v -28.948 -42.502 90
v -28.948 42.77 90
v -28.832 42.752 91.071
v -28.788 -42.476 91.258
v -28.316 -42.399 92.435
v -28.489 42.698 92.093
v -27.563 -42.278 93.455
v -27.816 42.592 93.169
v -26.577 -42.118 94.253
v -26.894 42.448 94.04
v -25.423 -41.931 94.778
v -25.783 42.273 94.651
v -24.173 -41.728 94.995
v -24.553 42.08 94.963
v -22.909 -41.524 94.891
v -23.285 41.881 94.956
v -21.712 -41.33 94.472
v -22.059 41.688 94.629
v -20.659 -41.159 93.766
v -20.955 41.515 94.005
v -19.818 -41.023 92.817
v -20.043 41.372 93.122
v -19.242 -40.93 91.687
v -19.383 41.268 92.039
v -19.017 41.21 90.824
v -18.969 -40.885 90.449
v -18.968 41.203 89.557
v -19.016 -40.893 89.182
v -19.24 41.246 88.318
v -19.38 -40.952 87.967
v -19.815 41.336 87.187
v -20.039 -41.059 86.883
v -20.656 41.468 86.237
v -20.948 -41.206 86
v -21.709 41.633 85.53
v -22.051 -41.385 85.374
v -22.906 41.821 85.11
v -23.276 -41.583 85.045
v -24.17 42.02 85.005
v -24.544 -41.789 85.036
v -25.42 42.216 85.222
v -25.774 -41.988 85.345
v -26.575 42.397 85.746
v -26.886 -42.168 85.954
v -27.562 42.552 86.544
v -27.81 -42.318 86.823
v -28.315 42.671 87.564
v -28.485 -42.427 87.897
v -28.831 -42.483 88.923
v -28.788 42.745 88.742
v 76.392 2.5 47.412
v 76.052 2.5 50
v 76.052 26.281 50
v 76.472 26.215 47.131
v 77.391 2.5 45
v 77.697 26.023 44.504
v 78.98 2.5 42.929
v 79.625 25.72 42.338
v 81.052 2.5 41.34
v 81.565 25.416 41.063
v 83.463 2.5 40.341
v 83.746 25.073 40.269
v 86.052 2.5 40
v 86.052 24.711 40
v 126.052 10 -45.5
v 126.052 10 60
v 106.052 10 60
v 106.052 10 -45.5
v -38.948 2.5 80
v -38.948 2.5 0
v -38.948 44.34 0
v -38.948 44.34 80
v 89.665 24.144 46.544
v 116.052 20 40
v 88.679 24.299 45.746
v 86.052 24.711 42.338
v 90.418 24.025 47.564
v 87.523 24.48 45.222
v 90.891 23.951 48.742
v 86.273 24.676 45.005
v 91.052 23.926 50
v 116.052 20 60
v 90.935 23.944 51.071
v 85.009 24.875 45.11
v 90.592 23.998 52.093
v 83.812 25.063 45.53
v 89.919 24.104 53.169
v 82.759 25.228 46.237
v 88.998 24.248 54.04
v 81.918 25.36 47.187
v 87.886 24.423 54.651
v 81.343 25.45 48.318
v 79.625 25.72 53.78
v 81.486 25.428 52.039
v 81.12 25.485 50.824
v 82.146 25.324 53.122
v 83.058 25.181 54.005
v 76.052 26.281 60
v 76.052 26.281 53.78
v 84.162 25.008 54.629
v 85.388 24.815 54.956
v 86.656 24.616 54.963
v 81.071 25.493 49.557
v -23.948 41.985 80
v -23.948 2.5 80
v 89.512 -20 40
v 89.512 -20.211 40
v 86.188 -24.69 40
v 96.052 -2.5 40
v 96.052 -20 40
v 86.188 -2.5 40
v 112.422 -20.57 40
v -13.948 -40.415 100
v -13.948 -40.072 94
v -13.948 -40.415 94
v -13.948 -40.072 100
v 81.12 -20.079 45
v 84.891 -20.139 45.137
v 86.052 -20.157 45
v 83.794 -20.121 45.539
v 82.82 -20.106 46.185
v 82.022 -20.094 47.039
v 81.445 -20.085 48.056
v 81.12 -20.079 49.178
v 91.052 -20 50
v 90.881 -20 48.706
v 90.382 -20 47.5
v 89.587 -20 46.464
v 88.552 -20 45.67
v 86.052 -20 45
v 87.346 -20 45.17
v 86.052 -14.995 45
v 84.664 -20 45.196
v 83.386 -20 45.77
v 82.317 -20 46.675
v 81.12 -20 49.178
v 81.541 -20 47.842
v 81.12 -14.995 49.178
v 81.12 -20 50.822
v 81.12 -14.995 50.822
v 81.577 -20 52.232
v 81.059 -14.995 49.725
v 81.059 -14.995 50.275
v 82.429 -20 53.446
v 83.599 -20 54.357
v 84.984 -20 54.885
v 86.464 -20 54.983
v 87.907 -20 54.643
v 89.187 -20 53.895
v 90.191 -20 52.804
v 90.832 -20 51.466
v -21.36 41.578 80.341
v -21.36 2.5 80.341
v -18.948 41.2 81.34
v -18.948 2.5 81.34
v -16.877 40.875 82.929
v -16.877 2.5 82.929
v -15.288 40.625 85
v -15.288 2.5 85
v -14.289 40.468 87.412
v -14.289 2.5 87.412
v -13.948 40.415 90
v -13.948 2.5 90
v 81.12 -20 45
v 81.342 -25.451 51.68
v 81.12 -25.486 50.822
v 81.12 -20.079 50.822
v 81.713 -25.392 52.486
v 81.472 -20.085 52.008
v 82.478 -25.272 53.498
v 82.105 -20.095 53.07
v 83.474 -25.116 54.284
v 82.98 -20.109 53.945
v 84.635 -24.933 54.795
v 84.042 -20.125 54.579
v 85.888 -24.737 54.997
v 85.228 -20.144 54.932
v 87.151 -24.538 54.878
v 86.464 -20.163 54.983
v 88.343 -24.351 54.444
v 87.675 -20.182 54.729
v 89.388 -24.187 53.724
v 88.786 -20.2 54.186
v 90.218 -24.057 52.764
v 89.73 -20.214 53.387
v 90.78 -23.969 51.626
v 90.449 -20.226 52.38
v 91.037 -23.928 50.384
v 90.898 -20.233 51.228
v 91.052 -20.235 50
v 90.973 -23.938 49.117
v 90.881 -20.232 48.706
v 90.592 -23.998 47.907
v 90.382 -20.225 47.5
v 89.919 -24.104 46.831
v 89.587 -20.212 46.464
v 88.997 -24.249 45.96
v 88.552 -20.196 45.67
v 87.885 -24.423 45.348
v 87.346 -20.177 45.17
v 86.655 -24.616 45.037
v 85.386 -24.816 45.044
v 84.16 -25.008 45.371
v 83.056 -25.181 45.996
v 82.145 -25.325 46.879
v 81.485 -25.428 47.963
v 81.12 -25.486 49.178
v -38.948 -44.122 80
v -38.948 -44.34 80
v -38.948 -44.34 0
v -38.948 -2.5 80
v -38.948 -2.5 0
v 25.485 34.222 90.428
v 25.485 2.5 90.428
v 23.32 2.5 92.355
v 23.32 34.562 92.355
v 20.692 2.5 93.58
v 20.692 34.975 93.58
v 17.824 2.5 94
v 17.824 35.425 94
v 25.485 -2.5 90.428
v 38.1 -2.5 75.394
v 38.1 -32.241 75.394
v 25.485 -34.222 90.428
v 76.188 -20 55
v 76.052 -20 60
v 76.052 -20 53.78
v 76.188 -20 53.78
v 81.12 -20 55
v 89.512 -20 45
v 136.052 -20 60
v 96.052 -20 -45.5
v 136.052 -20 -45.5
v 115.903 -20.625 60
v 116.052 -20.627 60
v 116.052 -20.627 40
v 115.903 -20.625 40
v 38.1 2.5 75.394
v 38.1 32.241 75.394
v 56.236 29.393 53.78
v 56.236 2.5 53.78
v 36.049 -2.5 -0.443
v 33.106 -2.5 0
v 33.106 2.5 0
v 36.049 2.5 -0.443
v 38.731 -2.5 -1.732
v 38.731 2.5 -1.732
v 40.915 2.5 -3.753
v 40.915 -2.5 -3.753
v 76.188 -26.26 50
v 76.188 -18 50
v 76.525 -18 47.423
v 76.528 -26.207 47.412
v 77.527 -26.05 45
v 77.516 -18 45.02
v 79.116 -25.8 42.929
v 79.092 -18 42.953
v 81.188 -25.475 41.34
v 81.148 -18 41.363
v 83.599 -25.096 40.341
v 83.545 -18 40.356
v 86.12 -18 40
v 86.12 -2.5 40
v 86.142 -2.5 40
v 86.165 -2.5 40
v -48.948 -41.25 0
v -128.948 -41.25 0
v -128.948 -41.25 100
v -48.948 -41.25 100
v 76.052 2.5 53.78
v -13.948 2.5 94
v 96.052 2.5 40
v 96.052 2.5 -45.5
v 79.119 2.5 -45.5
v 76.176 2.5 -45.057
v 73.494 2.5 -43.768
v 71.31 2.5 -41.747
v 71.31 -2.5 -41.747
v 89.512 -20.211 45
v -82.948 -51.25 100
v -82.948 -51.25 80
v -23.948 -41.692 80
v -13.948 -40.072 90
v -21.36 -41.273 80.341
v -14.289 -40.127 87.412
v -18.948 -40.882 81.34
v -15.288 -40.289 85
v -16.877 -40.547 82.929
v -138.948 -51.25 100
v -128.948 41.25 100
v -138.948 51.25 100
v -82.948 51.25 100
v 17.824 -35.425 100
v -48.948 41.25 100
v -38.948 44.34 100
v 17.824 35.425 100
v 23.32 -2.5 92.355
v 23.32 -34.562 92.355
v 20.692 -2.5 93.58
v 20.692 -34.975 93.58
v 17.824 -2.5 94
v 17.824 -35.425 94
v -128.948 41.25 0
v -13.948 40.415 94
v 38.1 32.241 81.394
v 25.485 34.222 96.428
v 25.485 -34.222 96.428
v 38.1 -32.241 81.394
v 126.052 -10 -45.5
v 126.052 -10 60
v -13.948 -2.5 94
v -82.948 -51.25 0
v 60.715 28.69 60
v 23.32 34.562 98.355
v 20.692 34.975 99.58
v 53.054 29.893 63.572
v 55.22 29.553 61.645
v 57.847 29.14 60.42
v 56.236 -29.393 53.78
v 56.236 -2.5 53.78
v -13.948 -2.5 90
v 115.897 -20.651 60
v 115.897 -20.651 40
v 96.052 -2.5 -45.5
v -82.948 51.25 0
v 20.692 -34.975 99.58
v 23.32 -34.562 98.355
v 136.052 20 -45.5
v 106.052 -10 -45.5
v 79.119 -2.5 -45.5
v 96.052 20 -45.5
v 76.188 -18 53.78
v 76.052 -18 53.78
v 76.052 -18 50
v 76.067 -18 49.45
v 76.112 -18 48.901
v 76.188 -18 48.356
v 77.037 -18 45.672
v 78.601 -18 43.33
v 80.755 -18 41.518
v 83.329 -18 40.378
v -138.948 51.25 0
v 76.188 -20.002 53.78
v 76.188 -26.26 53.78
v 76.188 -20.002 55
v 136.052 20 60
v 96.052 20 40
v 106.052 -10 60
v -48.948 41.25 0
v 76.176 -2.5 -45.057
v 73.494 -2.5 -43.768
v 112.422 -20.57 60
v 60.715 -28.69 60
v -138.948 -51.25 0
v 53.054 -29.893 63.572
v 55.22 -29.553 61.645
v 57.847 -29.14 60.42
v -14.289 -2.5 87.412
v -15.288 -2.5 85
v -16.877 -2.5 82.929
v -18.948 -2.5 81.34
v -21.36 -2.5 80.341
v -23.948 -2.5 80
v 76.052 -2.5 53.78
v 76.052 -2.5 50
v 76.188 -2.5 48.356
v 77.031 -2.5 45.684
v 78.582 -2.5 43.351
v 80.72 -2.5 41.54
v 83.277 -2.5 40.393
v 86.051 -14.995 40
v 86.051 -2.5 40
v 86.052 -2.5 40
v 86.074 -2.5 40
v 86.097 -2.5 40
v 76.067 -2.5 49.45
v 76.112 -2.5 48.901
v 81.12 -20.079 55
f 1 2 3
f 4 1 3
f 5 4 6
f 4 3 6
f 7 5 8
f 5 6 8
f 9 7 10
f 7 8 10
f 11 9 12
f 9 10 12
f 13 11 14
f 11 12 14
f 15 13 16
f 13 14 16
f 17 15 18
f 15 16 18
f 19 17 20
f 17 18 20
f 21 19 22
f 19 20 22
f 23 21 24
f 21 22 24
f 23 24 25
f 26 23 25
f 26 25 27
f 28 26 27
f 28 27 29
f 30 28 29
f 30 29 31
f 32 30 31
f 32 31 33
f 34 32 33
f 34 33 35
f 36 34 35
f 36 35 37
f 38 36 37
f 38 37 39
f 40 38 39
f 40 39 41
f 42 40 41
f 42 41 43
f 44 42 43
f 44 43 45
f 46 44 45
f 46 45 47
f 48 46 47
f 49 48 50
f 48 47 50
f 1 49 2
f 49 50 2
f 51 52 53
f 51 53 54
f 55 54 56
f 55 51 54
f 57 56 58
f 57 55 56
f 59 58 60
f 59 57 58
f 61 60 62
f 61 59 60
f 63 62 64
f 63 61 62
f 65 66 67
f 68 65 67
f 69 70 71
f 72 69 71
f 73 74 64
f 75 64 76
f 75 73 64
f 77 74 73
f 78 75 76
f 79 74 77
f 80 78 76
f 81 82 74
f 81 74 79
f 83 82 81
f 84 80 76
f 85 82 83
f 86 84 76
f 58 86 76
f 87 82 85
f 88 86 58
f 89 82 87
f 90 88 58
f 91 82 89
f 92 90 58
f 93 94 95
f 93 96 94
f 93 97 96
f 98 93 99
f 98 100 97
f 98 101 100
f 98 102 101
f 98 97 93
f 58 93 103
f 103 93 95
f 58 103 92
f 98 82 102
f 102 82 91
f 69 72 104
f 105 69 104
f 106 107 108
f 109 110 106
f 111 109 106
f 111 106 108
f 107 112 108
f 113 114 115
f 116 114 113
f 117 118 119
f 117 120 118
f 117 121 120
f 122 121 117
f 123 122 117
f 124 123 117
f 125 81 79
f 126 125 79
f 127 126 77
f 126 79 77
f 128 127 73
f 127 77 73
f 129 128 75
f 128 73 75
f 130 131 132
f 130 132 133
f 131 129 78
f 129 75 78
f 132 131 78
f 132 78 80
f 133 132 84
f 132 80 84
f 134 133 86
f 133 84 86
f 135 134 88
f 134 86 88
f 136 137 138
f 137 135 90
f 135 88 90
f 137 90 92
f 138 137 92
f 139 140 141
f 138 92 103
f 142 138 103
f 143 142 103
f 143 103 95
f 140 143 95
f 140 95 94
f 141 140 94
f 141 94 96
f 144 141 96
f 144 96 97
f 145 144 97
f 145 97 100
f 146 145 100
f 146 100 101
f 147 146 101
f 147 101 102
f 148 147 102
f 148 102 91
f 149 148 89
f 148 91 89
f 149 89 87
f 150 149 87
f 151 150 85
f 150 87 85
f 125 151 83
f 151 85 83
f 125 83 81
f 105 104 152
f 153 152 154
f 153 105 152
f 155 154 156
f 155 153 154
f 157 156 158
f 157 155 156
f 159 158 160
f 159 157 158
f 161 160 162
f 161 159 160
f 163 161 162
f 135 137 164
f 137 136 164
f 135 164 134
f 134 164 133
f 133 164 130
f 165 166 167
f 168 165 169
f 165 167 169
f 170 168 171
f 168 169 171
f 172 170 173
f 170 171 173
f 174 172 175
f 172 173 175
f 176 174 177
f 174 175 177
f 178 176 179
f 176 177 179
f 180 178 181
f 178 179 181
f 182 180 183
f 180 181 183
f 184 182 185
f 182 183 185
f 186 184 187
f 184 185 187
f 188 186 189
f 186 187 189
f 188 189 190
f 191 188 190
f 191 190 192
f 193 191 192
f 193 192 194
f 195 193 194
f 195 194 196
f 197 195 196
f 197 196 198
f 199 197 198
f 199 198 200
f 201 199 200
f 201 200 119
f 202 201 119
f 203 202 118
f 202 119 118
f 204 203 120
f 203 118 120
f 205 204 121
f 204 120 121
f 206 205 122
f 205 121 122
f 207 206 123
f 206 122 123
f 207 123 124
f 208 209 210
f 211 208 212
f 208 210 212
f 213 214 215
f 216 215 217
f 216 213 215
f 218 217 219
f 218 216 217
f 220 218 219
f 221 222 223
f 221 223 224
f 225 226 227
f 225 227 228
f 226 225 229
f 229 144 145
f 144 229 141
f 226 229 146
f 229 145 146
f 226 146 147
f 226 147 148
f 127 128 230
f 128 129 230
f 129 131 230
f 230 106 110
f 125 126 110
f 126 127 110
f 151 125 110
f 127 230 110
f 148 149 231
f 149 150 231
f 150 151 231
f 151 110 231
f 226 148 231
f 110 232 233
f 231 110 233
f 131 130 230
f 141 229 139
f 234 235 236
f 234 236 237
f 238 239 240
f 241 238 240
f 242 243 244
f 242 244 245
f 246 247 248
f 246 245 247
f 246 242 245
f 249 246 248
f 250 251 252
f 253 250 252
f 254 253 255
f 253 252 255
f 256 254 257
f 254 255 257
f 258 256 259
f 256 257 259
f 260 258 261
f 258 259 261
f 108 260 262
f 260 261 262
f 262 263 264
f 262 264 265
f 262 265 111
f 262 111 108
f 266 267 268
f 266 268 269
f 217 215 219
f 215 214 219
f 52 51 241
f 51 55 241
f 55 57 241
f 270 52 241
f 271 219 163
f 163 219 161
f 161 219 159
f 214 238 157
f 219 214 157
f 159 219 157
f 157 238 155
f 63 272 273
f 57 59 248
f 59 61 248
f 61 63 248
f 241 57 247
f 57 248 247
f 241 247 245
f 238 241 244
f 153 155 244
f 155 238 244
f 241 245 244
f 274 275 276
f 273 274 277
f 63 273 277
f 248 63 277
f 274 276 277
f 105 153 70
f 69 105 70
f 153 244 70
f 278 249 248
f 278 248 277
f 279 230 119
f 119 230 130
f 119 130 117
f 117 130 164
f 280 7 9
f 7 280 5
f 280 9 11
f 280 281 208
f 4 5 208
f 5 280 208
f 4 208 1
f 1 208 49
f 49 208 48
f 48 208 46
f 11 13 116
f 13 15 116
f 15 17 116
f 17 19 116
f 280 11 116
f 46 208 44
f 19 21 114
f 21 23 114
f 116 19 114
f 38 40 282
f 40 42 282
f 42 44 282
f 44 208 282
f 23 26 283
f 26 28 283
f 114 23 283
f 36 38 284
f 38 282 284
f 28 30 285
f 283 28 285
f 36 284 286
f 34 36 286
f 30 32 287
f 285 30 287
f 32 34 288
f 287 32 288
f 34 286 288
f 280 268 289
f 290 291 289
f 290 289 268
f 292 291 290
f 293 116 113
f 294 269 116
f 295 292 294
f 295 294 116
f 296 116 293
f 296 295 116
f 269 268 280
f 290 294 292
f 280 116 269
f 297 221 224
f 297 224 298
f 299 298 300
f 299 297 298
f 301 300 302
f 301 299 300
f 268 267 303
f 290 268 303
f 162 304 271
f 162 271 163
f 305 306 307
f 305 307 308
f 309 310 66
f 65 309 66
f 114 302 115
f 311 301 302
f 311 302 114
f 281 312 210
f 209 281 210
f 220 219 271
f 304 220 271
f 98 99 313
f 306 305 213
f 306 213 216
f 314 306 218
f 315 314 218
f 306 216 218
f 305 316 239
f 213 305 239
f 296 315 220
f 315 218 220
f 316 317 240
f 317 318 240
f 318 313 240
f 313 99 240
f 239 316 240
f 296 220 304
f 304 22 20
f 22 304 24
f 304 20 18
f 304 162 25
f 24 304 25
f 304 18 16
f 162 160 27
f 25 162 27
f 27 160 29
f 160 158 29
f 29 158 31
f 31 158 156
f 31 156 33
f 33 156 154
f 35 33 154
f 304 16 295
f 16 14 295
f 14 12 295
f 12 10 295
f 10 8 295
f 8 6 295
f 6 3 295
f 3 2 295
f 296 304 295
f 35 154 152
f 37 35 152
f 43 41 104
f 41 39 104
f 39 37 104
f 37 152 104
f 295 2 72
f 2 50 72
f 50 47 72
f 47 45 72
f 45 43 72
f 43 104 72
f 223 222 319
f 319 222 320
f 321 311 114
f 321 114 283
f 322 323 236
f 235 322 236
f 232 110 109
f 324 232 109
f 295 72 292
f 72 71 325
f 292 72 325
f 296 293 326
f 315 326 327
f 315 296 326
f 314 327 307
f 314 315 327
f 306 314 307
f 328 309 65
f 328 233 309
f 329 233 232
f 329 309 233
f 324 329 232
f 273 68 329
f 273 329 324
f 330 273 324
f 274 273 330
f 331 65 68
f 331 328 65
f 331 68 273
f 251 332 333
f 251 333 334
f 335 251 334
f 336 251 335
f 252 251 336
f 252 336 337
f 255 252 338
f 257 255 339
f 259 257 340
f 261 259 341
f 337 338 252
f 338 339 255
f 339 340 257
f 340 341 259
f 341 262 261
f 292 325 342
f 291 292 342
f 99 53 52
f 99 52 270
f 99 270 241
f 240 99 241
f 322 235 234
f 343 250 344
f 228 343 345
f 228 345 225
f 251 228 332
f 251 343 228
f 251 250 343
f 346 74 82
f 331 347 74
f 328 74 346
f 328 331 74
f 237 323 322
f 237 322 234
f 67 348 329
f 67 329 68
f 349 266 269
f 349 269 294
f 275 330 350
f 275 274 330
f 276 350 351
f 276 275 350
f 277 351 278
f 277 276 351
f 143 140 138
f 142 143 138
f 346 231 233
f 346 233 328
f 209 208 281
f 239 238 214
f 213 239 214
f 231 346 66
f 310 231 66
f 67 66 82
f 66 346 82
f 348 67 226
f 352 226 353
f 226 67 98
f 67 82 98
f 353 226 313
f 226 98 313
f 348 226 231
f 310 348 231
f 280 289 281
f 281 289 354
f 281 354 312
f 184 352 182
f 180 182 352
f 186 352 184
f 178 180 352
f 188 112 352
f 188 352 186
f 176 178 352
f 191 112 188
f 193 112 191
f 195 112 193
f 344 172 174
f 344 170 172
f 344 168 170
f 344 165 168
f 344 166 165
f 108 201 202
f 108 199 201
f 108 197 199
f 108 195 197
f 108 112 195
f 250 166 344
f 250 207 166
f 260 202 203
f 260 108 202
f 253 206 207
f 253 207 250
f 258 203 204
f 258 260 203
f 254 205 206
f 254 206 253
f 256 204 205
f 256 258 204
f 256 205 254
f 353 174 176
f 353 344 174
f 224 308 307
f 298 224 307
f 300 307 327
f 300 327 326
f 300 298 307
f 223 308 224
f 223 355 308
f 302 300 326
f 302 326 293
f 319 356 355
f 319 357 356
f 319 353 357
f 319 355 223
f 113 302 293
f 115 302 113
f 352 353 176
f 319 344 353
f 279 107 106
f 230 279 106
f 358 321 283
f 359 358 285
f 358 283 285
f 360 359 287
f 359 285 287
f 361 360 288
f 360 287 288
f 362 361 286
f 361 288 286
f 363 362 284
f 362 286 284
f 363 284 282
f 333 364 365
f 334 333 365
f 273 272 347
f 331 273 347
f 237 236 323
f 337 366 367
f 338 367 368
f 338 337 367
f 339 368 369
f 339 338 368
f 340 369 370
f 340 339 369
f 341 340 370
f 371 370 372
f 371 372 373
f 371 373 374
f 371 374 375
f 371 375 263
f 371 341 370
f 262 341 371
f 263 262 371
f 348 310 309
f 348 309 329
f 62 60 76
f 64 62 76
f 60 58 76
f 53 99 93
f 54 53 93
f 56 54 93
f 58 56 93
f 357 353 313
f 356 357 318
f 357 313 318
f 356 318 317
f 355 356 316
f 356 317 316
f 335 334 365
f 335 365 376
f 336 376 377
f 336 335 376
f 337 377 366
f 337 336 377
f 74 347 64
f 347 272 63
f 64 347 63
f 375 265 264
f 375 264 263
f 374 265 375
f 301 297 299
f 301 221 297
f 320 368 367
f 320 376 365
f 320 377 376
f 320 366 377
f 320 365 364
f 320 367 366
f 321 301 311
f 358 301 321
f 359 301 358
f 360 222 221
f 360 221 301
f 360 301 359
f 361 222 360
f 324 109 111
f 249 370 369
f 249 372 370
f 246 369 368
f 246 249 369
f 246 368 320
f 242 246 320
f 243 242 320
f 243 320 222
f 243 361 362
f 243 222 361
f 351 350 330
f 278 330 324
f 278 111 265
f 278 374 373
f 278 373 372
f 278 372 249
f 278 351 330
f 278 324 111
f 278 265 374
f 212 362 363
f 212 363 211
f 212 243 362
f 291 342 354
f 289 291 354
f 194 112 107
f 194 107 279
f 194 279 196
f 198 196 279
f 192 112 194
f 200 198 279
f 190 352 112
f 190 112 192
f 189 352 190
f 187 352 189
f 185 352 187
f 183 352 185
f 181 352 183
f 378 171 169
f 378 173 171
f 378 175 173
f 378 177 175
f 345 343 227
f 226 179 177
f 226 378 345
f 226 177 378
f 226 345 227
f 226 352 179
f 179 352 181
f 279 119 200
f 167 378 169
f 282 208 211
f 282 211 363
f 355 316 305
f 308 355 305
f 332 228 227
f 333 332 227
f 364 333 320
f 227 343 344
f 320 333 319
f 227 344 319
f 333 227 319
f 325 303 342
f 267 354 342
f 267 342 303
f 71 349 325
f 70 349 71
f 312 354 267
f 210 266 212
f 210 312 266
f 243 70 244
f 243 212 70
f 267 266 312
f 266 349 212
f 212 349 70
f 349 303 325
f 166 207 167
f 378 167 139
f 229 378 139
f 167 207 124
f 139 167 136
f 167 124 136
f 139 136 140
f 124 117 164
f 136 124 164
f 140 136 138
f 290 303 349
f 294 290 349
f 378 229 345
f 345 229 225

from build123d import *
from build123d.topology import SkipClean

# Parameters (mm, degrees)
ESQUISSE1_W                   = 80
ESQUISSE1_H                   = 82.5
BOSS_EXTRU_3_DEPTH            = 100
ESQUISSE2_W                   = 25
ESQUISSE2_H                   = 20
BOSS_EXTRU_4_DEPTH            = 102.5
ENL_V_MAT_EXTRU_1_DEPTH       = 169.324814886
ESQUISSE5_W                   = 25
ESQUISSE5_H                   = 5
BOSS_EXTRU_6_DEPTH            = 80
ESQUISSE6_R                   = 5
ENL_V_MAT_EXTRU_2_DEPTH       = 200.531778938
CONG_1_R                      = 10
BOSS_EXTRU_7_DEPTH            = 132
BOSS_EXTRU_7_DEPTH_BACK       = 156
ESQUISSE7_W                   = 40
ESQUISSE7_H                   = 40
ESQUISSE7_W_2                 = 20
ESQUISSE7_H_2                 = 20
ESQUISSE8_W                   = 56.966100386
ESQUISSE8_H                   = 72.151969112
ESQUISSE8_H_2                 = 40
ENL_V_MAT_EXTRU_3_DEPTH       = 233.699228203
ESQUISSE9_W                   = 40
ESQUISSE9_H                   = 86.5
ENL_V_MAT_EXTRU_4_DEPTH       = 205.46819632
ESQUISSE10_W                  = 20
ESQUISSE10_H                  = 20
BOSS_EXTRU_9_DEPTH            = 40
BOSS_EXTRU_10_REACH           = 209.614
ESQUISSE11_W                  = 20
ESQUISSE11_H                  = 5
BOSS_EXTRU_11_DEPTH           = 20
ESQUISSE14_R                  = 5
ENL_V_MAT_EXTRU_5_DEPTH       = 200.531778938
CONG_2_R                      = 10
CONG_3_R                      = 10
BOSS_EXTRU_30_DEPTH           = 102.5
ESQUISSE27_W                  = 37.951925993
ESQUISSE27_H                  = 112.382443636
BOSS_EXTRU_49_DEPTH           = 60
ENL_V_MAT_EXTRU_8_DEPTH       = 205.784019015
ESQUISSE29_W                  = 18.162926374
ESQUISSE29_H                  = 48.488335355
ENL_V_MAT_EXTRU_9_DEPTH       = 205.784019015
ENL_V_MAT_EXTRU_15_DEPTH      = 188.114342077
ENL_V_MAT_EXTRU_15_DEPTH_BACK = 104
ENL_V_MAT_EXTRU_25_DEPTH      = 202.764949791
ENL_V_MAT_EXTRU_33_DEPTH      = 157
ENL_V_MAT_EXTRU_34_DEPTH      = 157
BOSS_EXTRU_60_REACH           = 180.699
ESQUISSE48_W                  = 90
ESQUISSE48_H                  = 5
ESQUISSE49_W                  = 4.284374684
ESQUISSE49_H                  = 33.615862906
BOSS_EXTRU_61_DEPTH           = 5
BOSS_EXTRU_63_DEPTH           = 44
BOSS_EXTRU_63_DEPTH_BACK      = 17.5
ENL_V_MAT_EXTRU_35_DEPTH      = 212.123022919
CONG_5_START                  = 2.5
CONG_5_DEPTH                  = 48.75
BOSS_EXTRU_70_DEPTH           = 15.5
CONG_6_R                      = 10
ESQUISSE70_W                  = 13.324534179
ESQUISSE70_H                  = 11.766054646
BOSS_EXTRU_72_DEPTH           = 5
ESQUISSE71_W                  = 4.931981982
ESQUISSE71_H                  = 11.766054646
BOSS_EXTRU_73_DEPTH           = 15
CONG_7_R                      = 10
ENL_V_MAT_EXTRU_36_DEPTH      = 208.613808082
BOSS_EXTRU_74_REACH           = 209.614
ESQUISSE75_W                  = 50.566617397
ESQUISSE75_H                  = 5
ENL_V_MAT_EXTRU_37_DEPTH      = 180.431723244
ENL_V_MAT_EXTRU_37_DEPTH_BACK = 60
CONG_8_R                      = 10


with BuildPart() as part:
    # Esquisse1 → Boss.-Extru.3 (new body)
    with BuildSketch(Plane.XY):
        Polygon((-138.948482562, -51.25), (-82.948482562, -51.25), (-38.948482562, -44.340452261), (-38.948482562, 44.340452261), (-82.948482562, 51.25), (-138.948482562, 51.25), align=None)
        with Locations((-88.948482562, 0)):
            Rectangle(ESQUISSE1_W, ESQUISSE1_H, mode=Mode.SUBTRACT)
    extrude(amount=BOSS_EXTRU_3_DEPTH)

    # Esquisse2 → Boss.-Extru.4 (add, through all)
    with BuildSketch(Plane(origin=(0, 51.25, 0), x_dir=(1, 0, 0), z_dir=(0, 1, 0))):
        with Locations((-26.448482562, -90)):
            Rectangle(ESQUISSE2_W, ESQUISSE2_H)
    extrude(amount=-BOSS_EXTRU_4_DEPTH)

    # Esquisse4 → Enlèv. mat.-Extru.1 (cut, through all)
    with BuildSketch(Plane(origin=(0, 0, 80), x_dir=(-1, 0, 0), z_dir=(0, 0, -1))):
        Polygon((82.948482562, 51.25), (7.101445633, 39.733012599), (13.461078658, 66.038767386), (82.948482562, 62.280802417), align=None)
        Polygon((82.948482562, -51.25), (-9.375785388, -36.29350948), (26.758493166, -73.584084948), align=None)
    extrude(amount=-ENL_V_MAT_EXTRU_1_DEPTH, mode=Mode.SUBTRACT)

    # Esquisse5 → Boss.-Extru.6 (add)
    with BuildSketch(Plane(origin=(0, 0, 80), x_dir=(-1, 0, 0), z_dir=(0, 0, -1))):
        with Locations((26.448482562, 0)):
            Rectangle(ESQUISSE5_W, ESQUISSE5_H)
    extrude(amount=BOSS_EXTRU_6_DEPTH)

    # Esquisse6 → Enlèv. mat.-Extru.2 (cut, through all)
    with BuildSketch(Plane(origin=(0, 51.25, 0), x_dir=(1, 0, 0), z_dir=(0, 1, 0))):
        with Locations(Location((-23.948482562, -90, 0), (0, 0, 180))):
            Circle(ESQUISSE6_R)
    extrude(amount=-ENL_V_MAT_EXTRU_2_DEPTH, mode=Mode.SUBTRACT)

    # Congé1
    cong_1_edges = [part.edges().sort_by_distance(p)[0] for p in [
        (-13.948482562, -21.286015279, 80),
        (-13.948482562, 21.636350193, 80),
    ]]
    fillet(cong_1_edges, radius=CONG_1_R)

    # Esquisse21 → Boss.-Extru.30 (add, through all)
    with BuildSketch(Plane(origin=(0, 51.25, 0), x_dir=(1, 0, 0), z_dir=(0, 1, 0))):
        with BuildLine():
            Line((40.768208739, -72.213938048), (25.484900041, -90.427876097))
            ThreePointArc((25.484900041, -90.427876097), (22.050638227, -93.06307787), (17.824455609, -94))
            Line((17.824455609, -94), (13.584684534, -94))
            Line((13.584684534, -94), (-13.948482562, -94))
            Line((-13.948482562, -94), (-13.948482562, -97))
            Line((-13.948482562, -97), (-13.948482562, -100))
            Line((-13.948482562, -100), (17.824455609, -100))
            ThreePointArc((17.824455609, -100), (22.050638227, -99.06307787), (25.484900041, -96.427876097))
            Line((25.484900041, -96.427876097), (43.69734513, -74.723129231))
            Line((43.69734513, -74.723129231), (40.768208739, -72.213938048))
        make_face()
    extrude(amount=-BOSS_EXTRU_30_DEPTH)



with BuildPart() as body_2:
    # Esquisse7 → Boss.-Extru.7 (new, two sides: drawn at the far end of the back side and taken through both)
    with BuildSketch(Plane(origin=(0, 0, 0), x_dir=(-1, 0, 0), z_dir=(0, 0, -1)).offset(-BOSS_EXTRU_7_DEPTH_BACK)):
        with Locations((-116.051517438, 0)):
            Rectangle(ESQUISSE7_W, ESQUISSE7_H)
        with Locations((-116.051517438, 0)):
            Rectangle(ESQUISSE7_W_2, ESQUISSE7_H_2, mode=Mode.SUBTRACT)
    extrude(amount=BOSS_EXTRU_7_DEPTH + BOSS_EXTRU_7_DEPTH_BACK)

    # Esquisse8 → Enlèv. mat.-Extru.3 (cut, through all)
    with BuildSketch(Plane(origin=(0, 51.25, 0), x_dir=(1, 0, 0), z_dir=(0, 1, 0))):
        with Locations((124.534567631, -136.075984556)):
            Rectangle(ESQUISSE8_W, ESQUISSE8_H)
        with Locations((124.534567631, -80)):
            Rectangle(ESQUISSE8_W, ESQUISSE8_H_2)
    extrude(amount=-ENL_V_MAT_EXTRU_3_DEPTH, mode=Mode.SUBTRACT)

    # Esquisse9 → Enlèv. mat.-Extru.4 (cut, through all)
    with BuildSketch(Plane(origin=(0, 20, 0), x_dir=(1, 0, 0), z_dir=(0, 1, 0))):
        with Locations((116.051517438, 88.75)):
            Rectangle(ESQUISSE9_W, ESQUISSE9_H)
    extrude(amount=-ENL_V_MAT_EXTRU_4_DEPTH, mode=Mode.SUBTRACT)

    # Esquisse10 → Boss.-Extru.9 (add)
    with BuildSketch(Plane(origin=(0, 20, 0), x_dir=(1, 0, 0), z_dir=(0, 1, 0))):
        with Locations((86.051517438, -50)):
            Rectangle(ESQUISSE10_W, ESQUISSE10_H)
    extrude(amount=-BOSS_EXTRU_9_DEPTH)

    # Esquisse11 → Boss.-Extru.10 (add, up to next)
    with BuildSketch(Plane(origin=(0, 0, -45.5), x_dir=(-1, 0, 0), z_dir=(0, 0, -1)), mode=Mode.PRIVATE) as boss_extru_10_sk1:
        with Locations((-86.051517438, 0)):
            Rectangle(ESQUISSE11_W, ESQUISSE11_H)
    boss_extru_10_tool1 = extrude(boss_extru_10_sk1.sketch, amount=-BOSS_EXTRU_10_REACH, mode=Mode.PRIVATE) - body_2.part
    add(boss_extru_10_tool1.solids().sort_by_distance((86.051517, 0, -45.5))[0])

    # Esquisse13 → Boss.-Extru.11 (add)
    with BuildSketch(Plane.XY.offset(60)):
        Polygon((116.051517438, 20), (76.051517438, 26.281407035), (76.051517438, 20), align=None)
        Polygon((116.051517438, -20.626903689), (76.051517438, -20), (75.510830831, -26.86550344), align=None)
    extrude(amount=-BOSS_EXTRU_11_DEPTH)


with BuildPart() as boss_extru_11_piece_1:
    # of the separate pieces the step leaves, piece 1, a body of its own (boss_extru_11_pieces)
    add(body_2.part.solids().sort_by_distance((136.051517438, -20, 60))[0])


with BuildPart() as boss_extru_11_piece_2:
    # of the separate pieces the step leaves, piece 2, a body of its own (boss_extru_11_pieces)
    add(body_2.part.solids().sort_by_distance((116.051517438, -20.626903689, 60))[0])


with BuildPart() as enl_v_mat_extru_5_tool:
    # Esquisse14 → Enlèv. mat.-Extru.5 (new, through all)
    with BuildSketch(Plane(origin=(0, 51.25, 0), x_dir=(1, 0, 0), z_dir=(0, 1, 0))):
        with Locations((86.051517438, -50)):
            Circle(ESQUISSE14_R)
    extrude(amount=-ENL_V_MAT_EXTRU_5_DEPTH)


with BuildPart() as boss_extru_11_piece_1_1:
    add(boss_extru_11_piece_1.part)

    # Enlèv. mat.-Extru.5: cut by enl_v_mat_extru_5_tool
    add(enl_v_mat_extru_5_tool.part, mode=Mode.SUBTRACT)

    # Congé2
    cong_2_edges = [boss_extru_11_piece_1_1.edges().sort_by_distance(p)[0] for p in [
        (76.051517438, -11.25, 40),
        (76.051517438, 14.390703518, 40),
    ]]
    fillet(cong_2_edges, radius=CONG_2_R)


with BuildPart() as boss_extru_11_piece_2_1:
    add(boss_extru_11_piece_2.part)

    # Enlèv. mat.-Extru.5: cut by enl_v_mat_extru_5_tool
    add(enl_v_mat_extru_5_tool.part, mode=Mode.SUBTRACT)

    # Congé3
    cong_3_edges = [boss_extru_11_piece_2_1.edges().sort_by_distance(p)[0] for p in [
        (75.781174135, -23.43275172, 40),
    ]]
    fillet(cong_3_edges, radius=CONG_3_R)


with BuildPart() as part_1:
    add(part.part)

    add(boss_extru_11_piece_1_1.part)  # Boss.-Extru.49 merges Boss.-Extru.11 piece 1

    add(boss_extru_11_piece_2_1.part)  # Boss.-Extru.49 merges Boss.-Extru.11 piece 2
    # Esquisse27 → Boss.-Extru.49 (add, through all)
    with BuildSketch(Plane(origin=(0, 0, 40), x_dir=(-1, 0, 0), z_dir=(0, 0, -1))):
        with Locations((-57.075554442, -0.659134567)):
            Rectangle(ESQUISSE27_W, ESQUISSE27_H)
    extrude(amount=-BOSS_EXTRU_49_DEPTH)

    # Esquisse28 → Enlèv. mat.-Extru.8 (cut, through all)
    with BuildSketch(Plane(origin=(0, 55.532087251, 0), x_dir=(1, 0, 0), z_dir=(0, 1, 0))):
        with BuildLine():
            ThreePointArc((60.71459402, -60), (56.488411402, -60.93692213), (53.054149588, -63.572123903))
            Line((53.054149588, -63.572123903), (38.099591445, -81.394272297))
            Line((38.099591445, -81.394272297), (38.099591445, -100))
            Line((38.099591445, -100), (76.006099273, -100))
            Line((76.006099273, -100), (76.051517438, -60))
            Line((76.051517438, -60), (60.71459402, -60))
        make_face()
    extrude(amount=-ENL_V_MAT_EXTRU_8_DEPTH, mode=Mode.SUBTRACT)


with BuildPart() as enl_v_mat_extru_8_piece_1:
    # of the separate pieces the step leaves, piece 1, a body of its own (enl_v_mat_extru_8_pieces)
    add(part_1.part.solids().sort_by_distance((86.070114786, -20.157017391, 40))[0])

    # Esquisse33 → Enlèv. mat.-Extru.15 (cut, two sides: drawn at the far end of the back side and taken through both)
    with BuildSketch(Plane.XZ.offset(20).offset(-ENL_V_MAT_EXTRU_15_DEPTH_BACK)):
        Polygon((27.047173314, 88.566031311), (73.834674686, 32.806858462), (27.047173314, 32.806858462), align=None)
    extrude(amount=ENL_V_MAT_EXTRU_15_DEPTH + ENL_V_MAT_EXTRU_15_DEPTH_BACK, mode=Mode.SUBTRACT)

    # Esquisse36 → Enlèv. mat.-Extru.25 (cut, through all)
    with BuildSketch(Plane.XZ.offset(51.25)):
        Polygon((79.625069152, 53.780166313), (51.611850064, 53.780166313), (51.611850064, 28.403485492), (51.611850064, 26.096514508), (51.611850064, 20.164303407), (79.625069152, 20.164303407), align=None)
    extrude(amount=-ENL_V_MAT_EXTRU_25_DEPTH, mode=Mode.SUBTRACT)

    # Esquisse46 → Enlèv. mat.-Extru.33 (cut)
    with BuildSketch(Plane(origin=(0, 0, -45.5), x_dir=(-1, 0, 0), z_dir=(0, 0, -1))):
        Polygon((-116.051517438, 20), (82.948482562, 51.25), (-79.954636435, 76.953960671), align=None)
    extrude(amount=-ENL_V_MAT_EXTRU_33_DEPTH, mode=Mode.SUBTRACT)

    # Esquisse47 → Enlèv. mat.-Extru.34 (cut)
    with BuildSketch(Plane(origin=(0, 0, -45.5), x_dir=(-1, 0, 0), z_dir=(0, 0, -1))):
        Polygon((-82.644960183, -25.767668615), (82.948482562, -51.25), (-105.331317256, -68.548851228), align=None)
    extrude(amount=-ENL_V_MAT_EXTRU_34_DEPTH, mode=Mode.SUBTRACT)

    # Esquisse48 → Boss.-Extru.60 (add, up to next)
    with BuildSketch(Plane(origin=(0, 0, 0), x_dir=(-1, 0, 0), z_dir=(0, 0, -1)), mode=Mode.PRIVATE) as boss_extru_60_sk1:
        with Locations((-31.051517438, 0)):
            Rectangle(ESQUISSE48_W, ESQUISSE48_H)
    boss_extru_60_tool1 = extrude(boss_extru_60_sk1.sketch, amount=-BOSS_EXTRU_60_REACH, mode=Mode.PRIVATE) - enl_v_mat_extru_8_piece_1.part
    add(boss_extru_60_tool1.solids().sort_by_distance((31.051517, 0, 0))[0])

    # Esquisse49 → Boss.-Extru.61 (add)
    with SkipClean():  # the faces are left unmerged after this step: merging them gives an invalid solid
        with BuildSketch(Plane.XZ.offset(2.5)):
            with Locations((77.48288181, 36.97223486)):
                Rectangle(ESQUISSE49_W, ESQUISSE49_H)
        extrude(amount=-BOSS_EXTRU_61_DEPTH)

    # Esquisse51 → Boss.-Extru.63 (add, two sides: drawn at the far end of the back side and taken through both)
    with BuildSketch(Plane(origin=(0, 20, 0), x_dir=(1, 0, 0), z_dir=(0, 1, 0)).offset(-BOSS_EXTRU_63_DEPTH_BACK)):
        Polygon((76.051517438, -40), (76.051517438, -53.780166313), (79.625069152, -53.780166313), (79.625069152, -42.33835772), (86.051517438, -42.33835772), (86.051517438, -40), align=None)
    extrude(amount=BOSS_EXTRU_63_DEPTH + BOSS_EXTRU_63_DEPTH_BACK)

    # Esquisse53 → Enlèv. mat.-Extru.35 (cut, through all)
    with BuildSketch(Plane.XY.offset(100)):
        Polygon((-80.095816123, 50.802031024), (116.051517438, 20), (116.051517438, 87.283768072), (-75.409684876, 80.643314802), align=None)
    extrude(amount=-ENL_V_MAT_EXTRU_35_DEPTH, mode=Mode.SUBTRACT)

    # Congé5: read off the stored shape, not the designer's step
    # Congé5 outline → Congé5 (cut)
    with BuildSketch(Plane(origin=(0, 0, 0), x_dir=(1, 0, 0), z_dir=(0, 1, 0)).offset(CONG_5_START)):
        with BuildLine():
            ThreePointArc((76.051517438, -50), (78.980449626, -42.928932188), (86.051517438, -40))
            Line((86.051517438, -40), (76.051517438, -40))
            Line((76.051517438, -40), (76.051517438, -50))
        make_face()
    extrude(amount=CONG_5_DEPTH, mode=Mode.SUBTRACT)

    # Esquisse68 → Boss.-Extru.70 (add)
    with BuildSketch(Plane.XZ.offset(2.5)):
        Polygon((76.051517438, 53.780166313), (76.051517438, 40), (91.051517438, 40), (79.625069152, 44.222715095), (79.625069152, 53.780166313), align=None)
    extrude(amount=BOSS_EXTRU_70_DEPTH)

    # Congé6
    cong_6_edges = [enl_v_mat_extru_8_piece_1.edges().sort_by_distance(p)[0] for p in [
        (76.051517438, -10.25, 40),
    ]]
    fillet(cong_6_edges, radius=CONG_6_R - 0.0001)  # a hair under: the kernel refuses the full size

    # Esquisse70 → Boss.-Extru.72 (add)
    with BuildSketch(Plane(origin=(0, 0, 40), x_dir=(-1, 0, 0), z_dir=(0, 0, -1))):
        with Locations((-82.849820564, -20.878338717)):
            Rectangle(ESQUISSE70_W, ESQUISSE70_H)
    extrude(amount=-BOSS_EXTRU_72_DEPTH)

    # Esquisse71 → Boss.-Extru.73 (add)
    with BuildSketch(Plane(origin=(0, 0, 40), x_dir=(-1, 0, 0), z_dir=(0, 0, -1))):
        with Locations((-78.653544465, -20.878338717)):
            Rectangle(ESQUISSE71_W, ESQUISSE71_H)
    extrude(amount=-BOSS_EXTRU_73_DEPTH)

    # Congé7
    # the kernel refuses this fillet: 10 mm, written as the material it takes off along each edge
    with BuildSketch(Plane(origin=(76.187553474, 10.004688606, 40), x_dir=(1, 0, 0), z_dir=(0, -1, 0))) as cong_7_piece_1_section:
        with BuildLine():
            CenterArc((CONG_7_R, CONG_7_R), CONG_7_R, 180, 90)
            Line((0, CONG_7_R), (0, 0))
            Line((0, 0), (CONG_7_R, 0))
        make_face()
    cong_7_piece_1 = extrude(amount=61.766054646, mode=Mode.PRIVATE)
    cong_7_piece_1 = cong_7_piece_1 - Plane(origin=(86.051517438, 10.004688606, 50), x_dir=(-1.0, 0, 4.5931614069849837e-11), z_dir=(0, -1, 0)) * Cylinder(10, 164, mode=Mode.PRIVATE)
    cong_7_piece_1 = split(cong_7_piece_1, bisect_by=Plane(origin=(76.187553474, -2.5, 40), z_dir=(0, -1, 0)), keep=Keep.TOP, mode=Mode.PRIVATE)
    add(cong_7_piece_1, mode=Mode.SUBTRACT)
    with BuildSketch(Plane(origin=(76.187553474, 10.004688606, 40), x_dir=(1, 0, 0), z_dir=(0, -1, 0))) as cong_7_piece_2_section:
        with BuildLine():
            CenterArc((CONG_7_R, CONG_7_R), CONG_7_R, 180, 90)
            Line((0, CONG_7_R), (0, 0))
            Line((0, 0), (CONG_7_R, 0))
        make_face()
    cong_7_piece_2 = extrude(amount=61.766054646, mode=Mode.PRIVATE)
    cong_7_piece_2 = split(cong_7_piece_2, bisect_by=Plane(origin=(76.187553474, -18, 40), z_dir=(0, -1, 0)), keep=Keep.TOP, mode=Mode.PRIVATE)
    add(cong_7_piece_2, mode=Mode.SUBTRACT)

    # Esquisse73 → Enlèv. mat.-Extru.36 (cut, through all)
    with BuildSketch(Plane(origin=(0, 0, -45.5), x_dir=(-1, 0, 0), z_dir=(0, 0, -1))):
        Polygon((-116.051517438, -20), (82.948482562, -51.25), (-108.62699009, -51.25), align=None)
    extrude(amount=-ENL_V_MAT_EXTRU_36_DEPTH, mode=Mode.SUBTRACT)


with BuildPart() as enl_v_mat_extru_8_piece_2:
    # of the separate pieces the step leaves, piece 2, a body of its own (enl_v_mat_extru_8_pieces)
    add(part_1.part.solids().sort_by_distance((76.051517438, 55.532087251, 100))[0])

    # Esquisse29 → Enlèv. mat.-Extru.9 (cut, through all)
    with BuildSketch(Plane(origin=(0, 55.532087251, 0), x_dir=(1, 0, 0), z_dir=(0, 1, 0))):
        with Locations((77.464518916, -84.244167678)):
            Rectangle(ESQUISSE29_W, ESQUISSE29_H)
    extrude(amount=-ENL_V_MAT_EXTRU_9_DEPTH, mode=Mode.SUBTRACT)


with BuildPart() as enl_v_mat_extru_36_piece_1:
    # of the separate pieces the step leaves, piece 1, a body of its own (enl_v_mat_extru_36_pieces)
    add(enl_v_mat_extru_8_piece_1.part.solids().sort_by_distance((86.051417438, -2.5, 40))[0])

    # Esquisse75 → Boss.-Extru.74 (add, up to next)
    with BuildSketch(Plane(origin=(0, 0, -45.5), x_dir=(-1, 0, 0), z_dir=(0, 0, -1)), mode=Mode.PRIVATE) as boss_extru_74_sk1:
        with Locations((-50.76820874, 0)):
            Rectangle(ESQUISSE75_W, ESQUISSE75_H)
    boss_extru_74_tool1 = extrude(boss_extru_74_sk1.sketch, amount=-BOSS_EXTRU_74_REACH, mode=Mode.PRIVATE) - enl_v_mat_extru_36_piece_1.part
    add(boss_extru_74_tool1.solids().sort_by_distance((50.768209, 0, -45.5))[0])

    # Esquisse76 → Enlèv. mat.-Extru.37 (cut, two sides: drawn at the far end of the back side and taken through both)
    with BuildSketch(Plane(origin=(0, 2.5, 0), x_dir=(1, 0, 0), z_dir=(0, 1, 0)).offset(-ENL_V_MAT_EXTRU_37_DEPTH_BACK)):
        with BuildLine():
            Line((40.914809763, 3.753049524), (74.971252324, 46.323602726))
            Line((74.971252324, 46.323602726), (25.484900041, 45.5))
            Line((25.484900041, 45.5), (25.484900041, 0))
            Line((25.484900041, 0), (33.106121669, 0))
            ThreePointArc((33.106121669, 0), (37.438008974, 0.986967637), (40.914809763, 3.753049524))
        make_face()
    extrude(amount=ENL_V_MAT_EXTRU_37_DEPTH + ENL_V_MAT_EXTRU_37_DEPTH_BACK, mode=Mode.SUBTRACT)

    # Congé8
    cong_8_edges = [enl_v_mat_extru_36_piece_1.edges().sort_by_distance(p)[0] for p in [
        (74.312370144, 0, -45.5),
    ]]
    fillet(cong_8_edges, radius=CONG_8_R)


with BuildPart() as enl_v_mat_extru_36_piece_2:
    # of the separate pieces the step leaves, piece 2, a body of its own (enl_v_mat_extru_36_pieces)
    add(enl_v_mat_extru_8_piece_1.part.solids().sort_by_distance((116.051517438, -20.626903689, 40))[0])


solid = Compound([enl_v_mat_extru_36_piece_1.part, enl_v_mat_extru_36_piece_2.part])
